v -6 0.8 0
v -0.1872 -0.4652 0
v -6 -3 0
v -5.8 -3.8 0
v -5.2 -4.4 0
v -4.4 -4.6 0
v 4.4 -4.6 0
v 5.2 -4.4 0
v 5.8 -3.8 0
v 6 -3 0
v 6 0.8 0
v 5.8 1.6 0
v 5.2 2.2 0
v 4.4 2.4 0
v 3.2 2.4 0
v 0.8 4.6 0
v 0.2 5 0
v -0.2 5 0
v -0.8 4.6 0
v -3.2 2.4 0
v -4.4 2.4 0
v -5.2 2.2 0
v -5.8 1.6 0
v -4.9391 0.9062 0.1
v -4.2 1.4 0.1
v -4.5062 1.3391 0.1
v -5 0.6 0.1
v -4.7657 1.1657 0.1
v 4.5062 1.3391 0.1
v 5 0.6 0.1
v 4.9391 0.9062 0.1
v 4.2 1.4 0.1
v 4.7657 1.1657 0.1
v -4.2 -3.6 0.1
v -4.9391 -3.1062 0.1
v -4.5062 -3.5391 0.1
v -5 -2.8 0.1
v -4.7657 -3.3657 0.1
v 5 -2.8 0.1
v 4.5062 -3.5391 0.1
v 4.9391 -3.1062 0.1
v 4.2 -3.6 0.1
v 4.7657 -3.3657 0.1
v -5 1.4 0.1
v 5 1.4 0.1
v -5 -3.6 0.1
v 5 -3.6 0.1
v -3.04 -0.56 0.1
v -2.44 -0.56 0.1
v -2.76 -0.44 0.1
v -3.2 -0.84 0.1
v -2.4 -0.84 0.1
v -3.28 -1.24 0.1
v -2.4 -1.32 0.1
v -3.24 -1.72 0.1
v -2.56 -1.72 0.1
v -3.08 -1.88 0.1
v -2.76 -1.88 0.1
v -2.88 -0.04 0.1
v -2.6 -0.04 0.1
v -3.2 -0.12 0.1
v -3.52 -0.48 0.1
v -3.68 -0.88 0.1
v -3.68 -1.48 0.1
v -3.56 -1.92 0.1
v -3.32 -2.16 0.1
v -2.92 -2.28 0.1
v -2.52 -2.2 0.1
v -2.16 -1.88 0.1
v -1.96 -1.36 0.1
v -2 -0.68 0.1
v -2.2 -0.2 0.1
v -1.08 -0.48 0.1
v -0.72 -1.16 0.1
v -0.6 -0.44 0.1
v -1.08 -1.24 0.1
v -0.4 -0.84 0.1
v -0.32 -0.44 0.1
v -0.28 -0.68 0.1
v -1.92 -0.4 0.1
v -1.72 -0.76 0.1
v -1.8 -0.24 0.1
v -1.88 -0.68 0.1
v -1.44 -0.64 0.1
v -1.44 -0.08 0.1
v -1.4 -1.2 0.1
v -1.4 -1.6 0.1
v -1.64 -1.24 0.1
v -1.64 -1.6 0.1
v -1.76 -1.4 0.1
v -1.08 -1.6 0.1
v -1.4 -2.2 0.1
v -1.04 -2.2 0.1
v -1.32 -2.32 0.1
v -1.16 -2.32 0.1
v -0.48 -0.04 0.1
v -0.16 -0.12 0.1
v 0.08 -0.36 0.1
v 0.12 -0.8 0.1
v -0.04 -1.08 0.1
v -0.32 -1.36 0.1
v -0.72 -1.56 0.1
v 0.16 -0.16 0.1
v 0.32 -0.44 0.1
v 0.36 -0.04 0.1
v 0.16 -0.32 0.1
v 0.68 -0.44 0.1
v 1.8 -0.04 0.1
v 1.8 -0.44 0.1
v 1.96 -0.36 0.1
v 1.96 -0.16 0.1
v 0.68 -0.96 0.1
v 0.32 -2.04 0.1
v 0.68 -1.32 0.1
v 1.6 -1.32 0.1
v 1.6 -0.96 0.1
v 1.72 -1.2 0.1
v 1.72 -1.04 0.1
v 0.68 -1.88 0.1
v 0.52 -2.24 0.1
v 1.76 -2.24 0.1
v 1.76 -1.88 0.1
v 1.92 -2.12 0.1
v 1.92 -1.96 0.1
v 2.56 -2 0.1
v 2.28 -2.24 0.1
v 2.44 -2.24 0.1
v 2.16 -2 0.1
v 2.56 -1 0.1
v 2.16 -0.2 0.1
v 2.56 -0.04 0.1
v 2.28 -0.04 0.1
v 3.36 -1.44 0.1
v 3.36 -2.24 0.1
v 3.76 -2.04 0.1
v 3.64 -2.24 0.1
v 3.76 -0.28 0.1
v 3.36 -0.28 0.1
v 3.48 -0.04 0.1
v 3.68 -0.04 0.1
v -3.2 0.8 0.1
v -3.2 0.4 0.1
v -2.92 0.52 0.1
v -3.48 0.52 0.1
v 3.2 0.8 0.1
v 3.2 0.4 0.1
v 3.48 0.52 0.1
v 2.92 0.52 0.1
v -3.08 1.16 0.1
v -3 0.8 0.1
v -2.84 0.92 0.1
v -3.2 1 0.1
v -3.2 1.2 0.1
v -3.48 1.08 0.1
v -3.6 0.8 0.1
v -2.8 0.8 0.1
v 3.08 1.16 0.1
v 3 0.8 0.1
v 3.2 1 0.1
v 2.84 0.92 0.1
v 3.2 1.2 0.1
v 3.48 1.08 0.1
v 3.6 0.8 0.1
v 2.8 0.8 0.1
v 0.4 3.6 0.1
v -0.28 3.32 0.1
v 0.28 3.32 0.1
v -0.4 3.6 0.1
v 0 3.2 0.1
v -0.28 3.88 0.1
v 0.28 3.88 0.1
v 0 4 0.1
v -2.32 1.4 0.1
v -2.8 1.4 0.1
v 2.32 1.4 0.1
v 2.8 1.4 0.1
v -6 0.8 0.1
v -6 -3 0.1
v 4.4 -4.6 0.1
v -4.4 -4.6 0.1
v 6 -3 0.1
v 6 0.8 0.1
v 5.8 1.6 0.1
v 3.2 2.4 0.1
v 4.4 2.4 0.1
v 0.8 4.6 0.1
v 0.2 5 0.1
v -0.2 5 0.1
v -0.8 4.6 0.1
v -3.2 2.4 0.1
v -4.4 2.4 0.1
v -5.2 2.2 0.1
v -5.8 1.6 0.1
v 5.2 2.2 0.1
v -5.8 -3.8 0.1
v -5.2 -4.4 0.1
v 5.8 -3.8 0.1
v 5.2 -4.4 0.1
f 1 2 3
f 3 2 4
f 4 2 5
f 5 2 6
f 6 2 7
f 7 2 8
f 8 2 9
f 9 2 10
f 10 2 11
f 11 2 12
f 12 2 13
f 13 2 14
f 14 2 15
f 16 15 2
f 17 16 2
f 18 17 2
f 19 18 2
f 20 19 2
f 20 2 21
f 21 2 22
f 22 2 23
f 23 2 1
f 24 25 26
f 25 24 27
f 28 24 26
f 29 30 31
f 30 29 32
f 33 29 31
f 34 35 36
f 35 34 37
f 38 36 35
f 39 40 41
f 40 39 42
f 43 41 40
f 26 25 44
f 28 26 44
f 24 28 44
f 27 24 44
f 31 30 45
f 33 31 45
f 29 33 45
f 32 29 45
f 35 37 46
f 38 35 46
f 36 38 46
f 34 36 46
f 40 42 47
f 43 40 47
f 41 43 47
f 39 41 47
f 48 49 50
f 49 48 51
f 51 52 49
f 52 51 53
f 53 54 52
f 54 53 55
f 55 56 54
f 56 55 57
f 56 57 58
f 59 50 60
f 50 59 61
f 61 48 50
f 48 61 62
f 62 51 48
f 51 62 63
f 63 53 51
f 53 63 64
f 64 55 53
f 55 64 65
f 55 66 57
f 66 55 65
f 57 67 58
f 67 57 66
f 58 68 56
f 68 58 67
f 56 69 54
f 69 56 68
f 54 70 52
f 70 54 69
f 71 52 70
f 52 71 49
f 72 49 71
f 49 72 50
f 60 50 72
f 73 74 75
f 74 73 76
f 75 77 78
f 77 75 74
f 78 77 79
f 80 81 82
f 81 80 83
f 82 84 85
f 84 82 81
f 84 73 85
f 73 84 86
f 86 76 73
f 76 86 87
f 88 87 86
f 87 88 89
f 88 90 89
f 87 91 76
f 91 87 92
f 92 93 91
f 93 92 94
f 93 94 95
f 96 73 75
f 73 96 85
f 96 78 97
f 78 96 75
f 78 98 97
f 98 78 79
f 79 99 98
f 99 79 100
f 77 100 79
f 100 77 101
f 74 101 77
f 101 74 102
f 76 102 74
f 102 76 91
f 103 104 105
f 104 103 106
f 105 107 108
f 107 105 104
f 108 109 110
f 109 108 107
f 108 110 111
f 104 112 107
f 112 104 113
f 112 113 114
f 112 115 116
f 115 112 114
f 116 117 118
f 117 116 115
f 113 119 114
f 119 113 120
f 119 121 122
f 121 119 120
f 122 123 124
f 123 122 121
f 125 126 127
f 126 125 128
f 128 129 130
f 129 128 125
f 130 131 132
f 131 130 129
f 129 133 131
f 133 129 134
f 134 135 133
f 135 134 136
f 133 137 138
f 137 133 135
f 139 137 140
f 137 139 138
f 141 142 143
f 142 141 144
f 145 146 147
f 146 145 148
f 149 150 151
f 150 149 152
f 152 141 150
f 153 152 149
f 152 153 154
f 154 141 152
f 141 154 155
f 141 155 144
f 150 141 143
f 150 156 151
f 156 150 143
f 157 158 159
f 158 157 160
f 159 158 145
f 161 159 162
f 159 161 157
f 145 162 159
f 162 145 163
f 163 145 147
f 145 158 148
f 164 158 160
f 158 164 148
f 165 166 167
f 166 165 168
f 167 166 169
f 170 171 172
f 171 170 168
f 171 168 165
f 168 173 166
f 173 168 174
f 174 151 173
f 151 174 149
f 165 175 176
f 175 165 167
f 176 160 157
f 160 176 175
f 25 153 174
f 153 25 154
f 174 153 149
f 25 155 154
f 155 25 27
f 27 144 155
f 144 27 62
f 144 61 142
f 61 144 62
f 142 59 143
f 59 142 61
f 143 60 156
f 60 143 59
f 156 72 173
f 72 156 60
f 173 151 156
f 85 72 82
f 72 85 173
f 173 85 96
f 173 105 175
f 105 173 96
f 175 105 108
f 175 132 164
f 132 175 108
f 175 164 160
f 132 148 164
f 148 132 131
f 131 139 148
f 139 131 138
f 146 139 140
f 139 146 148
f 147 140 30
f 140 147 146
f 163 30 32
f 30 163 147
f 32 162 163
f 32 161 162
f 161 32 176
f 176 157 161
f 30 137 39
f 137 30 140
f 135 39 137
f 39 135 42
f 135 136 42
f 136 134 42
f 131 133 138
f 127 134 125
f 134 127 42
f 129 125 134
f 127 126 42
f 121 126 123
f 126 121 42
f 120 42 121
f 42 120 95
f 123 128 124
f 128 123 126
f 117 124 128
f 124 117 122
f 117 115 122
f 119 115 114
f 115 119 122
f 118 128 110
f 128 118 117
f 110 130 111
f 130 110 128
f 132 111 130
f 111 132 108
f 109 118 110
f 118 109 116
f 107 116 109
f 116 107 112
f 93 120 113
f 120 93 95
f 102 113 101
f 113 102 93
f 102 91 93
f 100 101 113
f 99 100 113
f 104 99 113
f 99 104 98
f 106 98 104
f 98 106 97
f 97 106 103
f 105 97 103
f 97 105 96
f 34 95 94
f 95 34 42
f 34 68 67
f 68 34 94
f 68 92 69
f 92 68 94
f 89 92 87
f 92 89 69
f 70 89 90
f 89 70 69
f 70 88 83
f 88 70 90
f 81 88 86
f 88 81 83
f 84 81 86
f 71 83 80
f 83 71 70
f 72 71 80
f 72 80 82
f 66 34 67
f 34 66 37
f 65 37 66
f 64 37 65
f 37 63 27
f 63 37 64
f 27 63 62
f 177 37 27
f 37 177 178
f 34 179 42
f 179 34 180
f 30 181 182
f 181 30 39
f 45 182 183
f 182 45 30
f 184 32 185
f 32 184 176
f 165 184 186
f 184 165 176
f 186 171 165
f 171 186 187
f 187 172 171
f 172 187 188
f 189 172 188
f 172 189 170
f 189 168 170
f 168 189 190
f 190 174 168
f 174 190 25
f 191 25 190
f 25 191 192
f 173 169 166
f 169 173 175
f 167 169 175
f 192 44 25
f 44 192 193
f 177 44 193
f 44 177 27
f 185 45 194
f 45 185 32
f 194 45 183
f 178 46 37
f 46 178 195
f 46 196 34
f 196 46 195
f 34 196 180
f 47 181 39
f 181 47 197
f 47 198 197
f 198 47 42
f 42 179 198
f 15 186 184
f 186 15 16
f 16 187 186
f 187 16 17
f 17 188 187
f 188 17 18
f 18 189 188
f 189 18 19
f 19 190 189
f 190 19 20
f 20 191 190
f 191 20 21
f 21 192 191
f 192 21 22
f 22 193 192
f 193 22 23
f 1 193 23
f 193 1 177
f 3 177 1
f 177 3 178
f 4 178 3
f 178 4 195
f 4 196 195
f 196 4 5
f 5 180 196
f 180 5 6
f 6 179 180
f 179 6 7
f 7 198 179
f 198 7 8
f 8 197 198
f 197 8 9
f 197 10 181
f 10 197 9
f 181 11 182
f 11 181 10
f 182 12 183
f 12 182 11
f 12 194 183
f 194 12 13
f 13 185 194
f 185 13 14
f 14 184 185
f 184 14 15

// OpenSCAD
// file: ../p/1-4ndis.scad
use <../lib.scad>
function ldraw_lib__1_4ndis() = [
// 0 Disc Negative 0.25
// 0 Name: 1-4ndis.dat
// 0 Author: James Jessiman
// 0 !LDRAW_ORG Primitive UPDATE 2012-01
// 0 !LICENSE Licensed under CC BY 2.0 and CC BY 4.0 : see CAreadme.txt
// 
// 0 BFC CERTIFY CCW
  [0,"BFC","CERTIFY"],
  [0,"BFC","CCW"],
// 
// 0 !HISTORY 2002-03-23 [sbliss] Added BFC Statement
// 0 !HISTORY 2002-04-25 [PTadmin] Official Update 2002-02
// 0 !HISTORY 2007-06-22 [PTadmin] Header formatted for Contributor Agreement
// 0 !HISTORY 2008-07-01 [PTadmin] Official Update 2008-01
// 0 !HISTORY 2012-02-16 [Philo] Changed to CCW
// 0 !HISTORY 2012-03-30 [PTadmin] Official Update 2012-01
// 
// 
// 3 16 0.9239 0 0.3827 1 0 0 1 0 1
  [3,16,0.9239,0,0.3827,1,0,0,1,0,1],
// 3 16 0.7071 0 0.7071 0.9239 0 0.3827 1 0 1
  [3,16,0.7071,0,0.7071,0.9239,0,0.3827,1,0,1],
// 3 16 0.3827 0 0.9239 0.7071 0 0.7071 1 0 1
  [3,16,0.3827,0,0.9239,0.7071,0,0.7071,1,0,1],
// 3 16 0 0 1 0.3827 0 0.9239 1 0 1
  [3,16,0,0,1,0.3827,0,0.9239,1,0,1],
];
module ldraw_lib__1_4ndis(step=0, col=false, unit=2/5, alt=false, line=0.2, solid=!$preview)
    makepoly(ldraw_lib__1_4ndis(), step=step, col=col, unit=unit, alt=alt, line=line, solid=solid);
ldraw_lib__1_4ndis(line=0.2);
// file: ../p/1-4chrd.scad
use <../lib.scad>
function ldraw_lib__1_4chrd() = [
// 0 Chord 0.25
// 0 Name: 1-4chrd.dat
// 0 Author: Tony Hafner [hafhead]
// 0 !LDRAW_ORG Primitive UPDATE 2012-02
// 0 !LICENSE Licensed under CC BY 2.0 and CC BY 4.0 : see CAreadme.txt
// 
// 0 BFC CERTIFY CCW
  [0,"BFC","CERTIFY"],
  [0,"BFC","CCW"],
// 
// 0 !HISTORY 2004-04-22 [PTadmin] Official Update 2004-02
// 0 !HISTORY 2007-10-09 [PTadmin] Header formatted for Contributor Agreement
// 0 !HISTORY 2008-07-01 [PTadmin] Official Update 2008-01
// 0 !HISTORY 2012-08-02 [MMR1988] Re-creation with PrimGen2 and Rectifier
// 0 !HISTORY 2012-08-09 [PTadmin] Official Update 2012-02
// 
// 
// 4 16 0.9239 0 0.3827 0.3827 0 0.9239 0 0 1 1 0 0
  [4,16,0.9239,0,0.3827,0.3827,0,0.9239,0,0,1,1,0,0],
// 3 16 0.7071 0 0.7071 0.3827 0 0.9239 0.9239 0 0.3827
  [3,16,0.7071,0,0.7071,0.3827,0,0.9239,0.9239,0,0.3827],
];
module ldraw_lib__1_4chrd(step=0, col=false, unit=2/5, alt=false, line=0.2, solid=!$preview)
    makepoly(ldraw_lib__1_4chrd(), step=step, col=col, unit=unit, alt=alt, line=line, solid=solid);
ldraw_lib__1_4chrd(line=0.2);
// main file
use <../lib.scad>
use <../p/1-4chrd.scad>
use <../p/1-4ndis.scad>
function ldraw_lib__4603014b() = [
// 0 Sticker  1.2 x  1.5 with White "OPEN" on Red Sign
// 0 Name: 4603014b.dat
// 0 Author: Takeshi Takahashi [RainbowDolphin]
// 0 !LDRAW_ORG Part UPDATE 2020-03
// 0 !LICENSE Licensed under CC BY 2.0 and CC BY 4.0 : see CAreadme.txt
// 
// 0 BFC CERTIFY CCW
  [0,"BFC","CERTIFY"],
  [0,"BFC","CCW"],
// 
// 0 !KEYWORDS Cafe, Set 3061, Sweets
// 
// 0 !HISTORY 2020-12-29 [PTadmin] Official Update 2020-03
// 
// 
// 3 16 -15 0 2 -.468 0 -1.163 -15 0 -7.5
  [3,16,-15,0,2,-.468,0,-1.163,-15,0,-7.5],
// 3 16 -15 0 -7.5 -.468 0 -1.163 -14.5 0 -9.5
  [3,16,-15,0,-7.5,-.468,0,-1.163,-14.5,0,-9.5],
// 3 16 -14.5 0 -9.5 -.468 0 -1.163 -13 0 -11
  [3,16,-14.5,0,-9.5,-.468,0,-1.163,-13,0,-11],
// 3 16 -13 0 -11 -.468 0 -1.163 -11 0 -11.5
  [3,16,-13,0,-11,-.468,0,-1.163,-11,0,-11.5],
// 3 16 -11 0 -11.5 -.468 0 -1.163 11 0 -11.5
  [3,16,-11,0,-11.5,-.468,0,-1.163,11,0,-11.5],
// 3 16 11 0 -11.5 -.468 0 -1.163 13 0 -11
  [3,16,11,0,-11.5,-.468,0,-1.163,13,0,-11],
// 3 16 13 0 -11 -.468 0 -1.163 14.5 0 -9.5
  [3,16,13,0,-11,-.468,0,-1.163,14.5,0,-9.5],
// 3 16 14.5 0 -9.5 -.468 0 -1.163 15 0 -7.5
  [3,16,14.5,0,-9.5,-.468,0,-1.163,15,0,-7.5],
// 3 16 15 0 -7.5 -.468 0 -1.163 15 0 2
  [3,16,15,0,-7.5,-.468,0,-1.163,15,0,2],
// 3 16 15 0 2 -.468 0 -1.163 14.5 0 4
  [3,16,15,0,2,-.468,0,-1.163,14.5,0,4],
// 3 16 14.5 0 4 -.468 0 -1.163 13 0 5.5
  [3,16,14.5,0,4,-.468,0,-1.163,13,0,5.5],
// 3 16 13 0 5.5 -.468 0 -1.163 11 0 6
  [3,16,13,0,5.5,-.468,0,-1.163,11,0,6],
// 3 16 11 0 6 -.468 0 -1.163 8 0 6
  [3,16,11,0,6,-.468,0,-1.163,8,0,6],
// 3 16 2 0 11.5 8 0 6 -.468 0 -1.163
  [3,16,2,0,11.5,8,0,6,-.468,0,-1.163],
// 3 16 .5 0 12.5 2 0 11.5 -.468 0 -1.163
  [3,16,.5,0,12.5,2,0,11.5,-.468,0,-1.163],
// 3 16 -.5 0 12.5 .5 0 12.5 -.468 0 -1.163
  [3,16,-.5,0,12.5,.5,0,12.5,-.468,0,-1.163],
// 3 16 -2 0 11.5 -.5 0 12.5 -.468 0 -1.163
  [3,16,-2,0,11.5,-.5,0,12.5,-.468,0,-1.163],
// 3 16 -8 0 6 -2 0 11.5 -.468 0 -1.163
  [3,16,-8,0,6,-2,0,11.5,-.468,0,-1.163],
// 3 16 -8 0 6 -.468 0 -1.163 -11 0 6
  [3,16,-8,0,6,-.468,0,-1.163,-11,0,6],
// 3 16 -11 0 6 -.468 0 -1.163 -13 0 5.5
  [3,16,-11,0,6,-.468,0,-1.163,-13,0,5.5],
// 3 16 -13 0 5.5 -.468 0 -1.163 -14.5 0 4
  [3,16,-13,0,5.5,-.468,0,-1.163,-14.5,0,4],
// 3 16 -14.5 0 4 -.468 0 -1.163 -15 0 2
  [3,16,-14.5,0,4,-.468,0,-1.163,-15,0,2],
// 1 4 -10.5 -.25 1.5 0 0 -2 0 1 0 2 0 0 1-4chrd.dat
  [1,4,-10.5,-.25,1.5,0,0,-2,0,1,0,2,0,0, ldraw_lib__1_4chrd()],
// 1 4 10.5 -.25 1.5 2 0 0 0 1 0 0 0 2 1-4chrd.dat
  [1,4,10.5,-.25,1.5,2,0,0,0,1,0,0,0,2, ldraw_lib__1_4chrd()],
// 1 4 -10.5 -.25 -7 -2 0 0 0 1 0 0 0 -2 1-4chrd.dat
  [1,4,-10.5,-.25,-7,-2,0,0,0,1,0,0,0,-2, ldraw_lib__1_4chrd()],
// 1 4 10.5 -.25 -7 0 0 2 0 1 0 -2 0 0 1-4chrd.dat
  [1,4,10.5,-.25,-7,0,0,2,0,1,0,-2,0,0, ldraw_lib__1_4chrd()],
// 1 15 -10.5 -.25 1.5 0 0 -2 0 1 0 2 0 0 1-4ndis.dat
  [1,15,-10.5,-.25,1.5,0,0,-2,0,1,0,2,0,0, ldraw_lib__1_4ndis()],
// 1 15 10.5 -.25 1.5 2 0 0 0 1 0 0 0 2 1-4ndis.dat
  [1,15,10.5,-.25,1.5,2,0,0,0,1,0,0,0,2, ldraw_lib__1_4ndis()],
// 1 15 -10.5 -.25 -7 -2 0 0 0 1 0 0 0 -2 1-4ndis.dat
  [1,15,-10.5,-.25,-7,-2,0,0,0,1,0,0,0,-2, ldraw_lib__1_4ndis()],
// 1 15 10.5 -.25 -7 0 0 2 0 1 0 -2 0 0 1-4ndis.dat
  [1,15,10.5,-.25,-7,0,0,2,0,1,0,-2,0,0, ldraw_lib__1_4ndis()],
// 4 4 -6.1 -.25 -1.4 -6.9 -.25 -1.1 -7.6 -.25 -1.4 -8 -.25 -2.1
  [4,4,-6.1,-.25,-1.4,-6.9,-.25,-1.1,-7.6,-.25,-1.4,-8,-.25,-2.1],
// 4 4 -6 -.25 -2.1 -6.1 -.25 -1.4 -8 -.25 -2.1 -8.2 -.25 -3.1
  [4,4,-6,-.25,-2.1,-6.1,-.25,-1.4,-8,-.25,-2.1,-8.2,-.25,-3.1],
// 4 4 -6 -.25 -3.3 -6 -.25 -2.1 -8.2 -.25 -3.1 -8.1 -.25 -4.3
  [4,4,-6,-.25,-3.3,-6,-.25,-2.1,-8.2,-.25,-3.1,-8.1,-.25,-4.3],
// 4 4 -6.4 -.25 -4.3 -6 -.25 -3.3 -8.1 -.25 -4.3 -7.7 -.25 -4.7
  [4,4,-6.4,-.25,-4.3,-6,-.25,-3.3,-8.1,-.25,-4.3,-7.7,-.25,-4.7],
// 3 4 -6.4 -.25 -4.3 -7.7 -.25 -4.7 -6.9 -.25 -4.7
  [3,4,-6.4,-.25,-4.3,-7.7,-.25,-4.7,-6.9,-.25,-4.7],
// 4 15 -6.9 -.25 -1.1 -6.5 -.25 -.1 -7.2 -.25 -.1 -8 -.25 -.3
  [4,15,-6.9,-.25,-1.1,-6.5,-.25,-.1,-7.2,-.25,-.1,-8,-.25,-.3],
// 4 15 -7.6 -.25 -1.4 -6.9 -.25 -1.1 -8 -.25 -.3 -8.8 -.25 -1.2
  [4,15,-7.6,-.25,-1.4,-6.9,-.25,-1.1,-8,-.25,-.3,-8.8,-.25,-1.2],
// 4 15 -8 -.25 -2.1 -7.6 -.25 -1.4 -8.8 -.25 -1.2 -9.2 -.25 -2.2
  [4,15,-8,-.25,-2.1,-7.6,-.25,-1.4,-8.8,-.25,-1.2,-9.2,-.25,-2.2],
// 4 15 -8.2 -.25 -3.1 -8 -.25 -2.1 -9.2 -.25 -2.2 -9.2 -.25 -3.7
  [4,15,-8.2,-.25,-3.1,-8,-.25,-2.1,-9.2,-.25,-2.2,-9.2,-.25,-3.7],
// 4 15 -8.1 -.25 -4.3 -8.2 -.25 -3.1 -9.2 -.25 -3.7 -8.9 -.25 -4.8
  [4,15,-8.1,-.25,-4.3,-8.2,-.25,-3.1,-9.2,-.25,-3.7,-8.9,-.25,-4.8],
// 4 15 -8.1 -.25 -4.3 -8.9 -.25 -4.8 -8.3 -.25 -5.4 -7.7 -.25 -4.7
  [4,15,-8.1,-.25,-4.3,-8.9,-.25,-4.8,-8.3,-.25,-5.4,-7.7,-.25,-4.7],
// 4 15 -7.7 -.25 -4.7 -8.3 -.25 -5.4 -7.3 -.25 -5.7 -6.9 -.25 -4.7
  [4,15,-7.7,-.25,-4.7,-8.3,-.25,-5.4,-7.3,-.25,-5.7,-6.9,-.25,-4.7],
// 4 15 -6.9 -.25 -4.7 -7.3 -.25 -5.7 -6.3 -.25 -5.5 -6.4 -.25 -4.3
  [4,15,-6.9,-.25,-4.7,-7.3,-.25,-5.7,-6.3,-.25,-5.5,-6.4,-.25,-4.3],
// 4 15 -6.4 -.25 -4.3 -6.3 -.25 -5.5 -5.4 -.25 -4.7 -6 -.25 -3.3
  [4,15,-6.4,-.25,-4.3,-6.3,-.25,-5.5,-5.4,-.25,-4.7,-6,-.25,-3.3],
// 4 15 -6 -.25 -3.3 -5.4 -.25 -4.7 -4.9 -.25 -3.4 -6 -.25 -2.1
  [4,15,-6,-.25,-3.3,-5.4,-.25,-4.7,-4.9,-.25,-3.4,-6,-.25,-2.1],
// 4 15 -6 -.25 -2.1 -4.9 -.25 -3.4 -5 -.25 -1.7 -6.1 -.25 -1.4
  [4,15,-6,-.25,-2.1,-4.9,-.25,-3.4,-5,-.25,-1.7,-6.1,-.25,-1.4],
// 4 15 -6.1 -.25 -1.4 -5 -.25 -1.7 -5.5 -.25 -.5 -6.9 -.25 -1.1
  [4,15,-6.1,-.25,-1.4,-5,-.25,-1.7,-5.5,-.25,-.5,-6.9,-.25,-1.1],
// 3 15 -6.5 -.25 -.1 -6.9 -.25 -1.1 -5.5 -.25 -.5
  [3,15,-6.5,-.25,-.1,-6.9,-.25,-1.1,-5.5,-.25,-.5],
// 4 4 -2.7 -.25 -1.2 -2.7 -.25 -3.1 -1.8 -.25 -2.9 -1.5 -.25 -1.1
  [4,4,-2.7,-.25,-1.2,-2.7,-.25,-3.1,-1.8,-.25,-2.9,-1.5,-.25,-1.1],
// 4 4 -1.5 -.25 -1.1 -1.8 -.25 -2.9 -1 -.25 -2.1 -.8 -.25 -1.1
  [4,4,-1.5,-.25,-1.1,-1.8,-.25,-2.9,-1,-.25,-2.1,-.8,-.25,-1.1],
// 3 4 -.8 -.25 -1.1 -1 -.25 -2.1 -.7 -.25 -1.7
  [3,4,-.8,-.25,-1.1,-1,-.25,-2.1,-.7,-.25,-1.7],
// 4 15 -4.5 -.25 -.6 -4.8 -.25 -1 -4.7 -.25 -1.7 -4.3 -.25 -1.9
  [4,15,-4.5,-.25,-.6,-4.8,-.25,-1,-4.7,-.25,-1.7,-4.3,-.25,-1.9],
// 4 15 -4.5 -.25 -.6 -4.3 -.25 -1.9 -3.6 -.25 -1.6 -3.6 -.25 -.2
  [4,15,-4.5,-.25,-.6,-4.3,-.25,-1.9,-3.6,-.25,-1.6,-3.6,-.25,-.2],
// 4 15 -2.7 -.25 -1.2 -3.6 -.25 -.2 -3.6 -.25 -1.6 -3.5 -.25 -3
  [4,15,-2.7,-.25,-1.2,-3.6,-.25,-.2,-3.6,-.25,-1.6,-3.5,-.25,-3],
// 4 15 -2.7 -.25 -3.1 -2.7 -.25 -1.2 -3.5 -.25 -3 -3.5 -.25 -4
  [4,15,-2.7,-.25,-3.1,-2.7,-.25,-1.2,-3.5,-.25,-3,-3.5,-.25,-4],
// 4 15 -3.5 -.25 -4 -3.5 -.25 -3 -4.1 -.25 -3.1 -4.1 -.25 -4
  [4,15,-3.5,-.25,-4,-3.5,-.25,-3,-4.1,-.25,-3.1,-4.1,-.25,-4],
// 3 15 -4.1 -.25 -3.1 -4.4 -.25 -3.5 -4.1 -.25 -4
  [3,15,-4.1,-.25,-3.1,-4.4,-.25,-3.5,-4.1,-.25,-4],
// 4 15 -2.7 -.25 -4 -2.7 -.25 -3.1 -3.5 -.25 -4 -3.5 -.25 -5.5
  [4,15,-2.7,-.25,-4,-2.7,-.25,-3.1,-3.5,-.25,-4,-3.5,-.25,-5.5],
// 4 15 -2.6 -.25 -5.5 -2.7 -.25 -4 -3.5 -.25 -5.5 -3.3 -.25 -5.8
  [4,15,-2.6,-.25,-5.5,-2.7,-.25,-4,-3.5,-.25,-5.5,-3.3,-.25,-5.8],
// 3 15 -2.6 -.25 -5.5 -3.3 -.25 -5.8 -2.9 -.25 -5.8
  [3,15,-2.6,-.25,-5.5,-3.3,-.25,-5.8,-2.9,-.25,-5.8],
// 4 15 -1.2 -.25 -.1 -3.6 -.25 -.2 -2.7 -.25 -1.2 -1.5 -.25 -1.1
  [4,15,-1.2,-.25,-.1,-3.6,-.25,-.2,-2.7,-.25,-1.2,-1.5,-.25,-1.1],
// 4 15 -.4 -.25 -.3 -1.2 -.25 -.1 -1.5 -.25 -1.1 -.8 -.25 -1.1
  [4,15,-.4,-.25,-.3,-1.2,-.25,-.1,-1.5,-.25,-1.1,-.8,-.25,-1.1],
// 4 15 .2 -.25 -.9 -.4 -.25 -.3 -.8 -.25 -1.1 -.7 -.25 -1.7
  [4,15,.2,-.25,-.9,-.4,-.25,-.3,-.8,-.25,-1.1,-.7,-.25,-1.7],
// 4 15 .3 -.25 -2 .2 -.25 -.9 -.7 -.25 -1.7 -.1 -.25 -2.7
  [4,15,.3,-.25,-2,.2,-.25,-.9,-.7,-.25,-1.7,-.1,-.25,-2.7],
// 4 15 -.1 -.25 -2.7 -.7 -.25 -1.7 -1 -.25 -2.1 -.8 -.25 -3.4
  [4,15,-.1,-.25,-2.7,-.7,-.25,-1.7,-1,-.25,-2.1,-.8,-.25,-3.4],
// 4 15 -.8 -.25 -3.4 -1 -.25 -2.1 -1.8 -.25 -2.9 -1.8 -.25 -3.9
  [4,15,-.8,-.25,-3.4,-1,-.25,-2.1,-1.8,-.25,-2.9,-1.8,-.25,-3.9],
// 4 15 -1.8 -.25 -3.9 -1.8 -.25 -2.9 -2.7 -.25 -3.1 -2.7 -.25 -4
  [4,15,-1.8,-.25,-3.9,-1.8,-.25,-2.9,-2.7,-.25,-3.1,-2.7,-.25,-4],
// 4 15 .9 -.25 -.1 .4 -.25 -.4 .4 -.25 -.8 .8 -.25 -1.1
  [4,15,.9,-.25,-.1,.4,-.25,-.4,.4,-.25,-.8,.8,-.25,-1.1],
// 4 15 .9 -.25 -.1 .8 -.25 -1.1 1.7 -.25 -1.1 4.5 -.25 -.1
  [4,15,.9,-.25,-.1,.8,-.25,-1.1,1.7,-.25,-1.1,4.5,-.25,-.1],
// 4 15 4.5 -.25 -.1 1.7 -.25 -1.1 4.5 -.25 -1.1 4.9 -.25 -.9
  [4,15,4.5,-.25,-.1,1.7,-.25,-1.1,4.5,-.25,-1.1,4.9,-.25,-.9],
// 3 15 4.5 -.25 -.1 4.9 -.25 -.9 4.9 -.25 -.4
  [3,15,4.5,-.25,-.1,4.9,-.25,-.9,4.9,-.25,-.4],
// 4 15 1.7 -.25 -2.4 1.7 -.25 -1.1 .8 -.25 -1.1 .8 -.25 -5.1
  [4,15,1.7,-.25,-2.4,1.7,-.25,-1.1,.8,-.25,-1.1,.8,-.25,-5.1],
// 3 15 1.7 -.25 -2.4 .8 -.25 -5.1 1.7 -.25 -3.3
  [3,15,1.7,-.25,-2.4,.8,-.25,-5.1,1.7,-.25,-3.3],
// 4 15 4 -.25 -2.4 1.7 -.25 -2.4 1.7 -.25 -3.3 4 -.25 -3.3
  [4,15,4,-.25,-2.4,1.7,-.25,-2.4,1.7,-.25,-3.3,4,-.25,-3.3],
// 4 15 4.3 -.25 -2.6 4 -.25 -2.4 4 -.25 -3.3 4.3 -.25 -3
  [4,15,4.3,-.25,-2.6,4,-.25,-2.4,4,-.25,-3.3,4.3,-.25,-3],
// 4 15 1.7 -.25 -4.7 1.7 -.25 -3.3 .8 -.25 -5.1 1.3 -.25 -5.6
  [4,15,1.7,-.25,-4.7,1.7,-.25,-3.3,.8,-.25,-5.1,1.3,-.25,-5.6],
// 4 15 4.4 -.25 -4.7 1.7 -.25 -4.7 1.3 -.25 -5.6 4.4 -.25 -5.6
  [4,15,4.4,-.25,-4.7,1.7,-.25,-4.7,1.3,-.25,-5.6,4.4,-.25,-5.6],
// 4 15 4.8 -.25 -4.9 4.4 -.25 -4.7 4.4 -.25 -5.6 4.8 -.25 -5.3
  [4,15,4.8,-.25,-4.9,4.4,-.25,-4.7,4.4,-.25,-5.6,4.8,-.25,-5.3],
// 4 15 6.4 -.25 -5 5.4 -.25 -5 5.7 -.25 -5.6 6.1 -.25 -5.6
  [4,15,6.4,-.25,-5,5.4,-.25,-5,5.7,-.25,-5.6,6.1,-.25,-5.6],
// 4 15 5.4 -.25 -5 6.4 -.25 -5 6.4 -.25 -2.5 5.4 -.25 -.5
  [4,15,5.4,-.25,-5,6.4,-.25,-5,6.4,-.25,-2.5,5.4,-.25,-.5],
// 4 15 5.7 -.25 -.1 5.4 -.25 -.5 6.4 -.25 -2.5 6.4 -.25 -.1
  [4,15,5.7,-.25,-.1,5.4,-.25,-.5,6.4,-.25,-2.5,6.4,-.25,-.1],
// 4 15 8.4 -.25 -3.6 6.4 -.25 -.1 6.4 -.25 -2.5 8.4 -.25 -5.6
  [4,15,8.4,-.25,-3.6,6.4,-.25,-.1,6.4,-.25,-2.5,8.4,-.25,-5.6],
// 4 15 8.4 -.25 -3.6 8.4 -.25 -5.6 9.1 -.25 -5.6 9.4 -.25 -5.1
  [4,15,8.4,-.25,-3.6,8.4,-.25,-5.6,9.1,-.25,-5.6,9.4,-.25,-5.1],
// 4 15 8.4 -.25 -.7 8.4 -.25 -3.6 9.4 -.25 -5.1 9.4 -.25 -.7
  [4,15,8.4,-.25,-.7,8.4,-.25,-3.6,9.4,-.25,-5.1,9.4,-.25,-.7],
// 4 15 8.7 -.25 -.1 8.4 -.25 -.7 9.4 -.25 -.7 9.2 -.25 -.1
  [4,15,8.7,-.25,-.1,8.4,-.25,-.7,9.4,-.25,-.7,9.2,-.25,-.1],
// 4 15 -8.7 -.25 1.3 -8 -.25 1 -7.3 -.25 1.3 -8 -.25 2
  [4,15,-8.7,-.25,1.3,-8,-.25,1,-7.3,-.25,1.3,-8,-.25,2],
// 4 15 7.3 -.25 1.3 8 -.25 1 8.7 -.25 1.3 8 -.25 2
  [4,15,7.3,-.25,1.3,8,-.25,1,8.7,-.25,1.3,8,-.25,2],
// 4 70 -7.1 -.25 2.3 -7.7 -.25 2.9 -8 -.25 2.5 -7.5 -.25 2
  [4,70,-7.1,-.25,2.3,-7.7,-.25,2.9,-8,-.25,2.5,-7.5,-.25,2],
// 3 70 -8 -.25 2.5 -8 -.25 2 -7.5 -.25 2
  [3,70,-8,-.25,2.5,-8,-.25,2,-7.5,-.25,2],
// 4 15 -8 -.25 2.5 -7.7 -.25 2.9 -8 -.25 3 -8.7 -.25 2.7
  [4,15,-8,-.25,2.5,-7.7,-.25,2.9,-8,-.25,3,-8.7,-.25,2.7],
// 4 15 -8 -.25 2 -8 -.25 2.5 -8.7 -.25 2.7 -9 -.25 2
  [4,15,-8,-.25,2,-8,-.25,2.5,-8.7,-.25,2.7,-9,-.25,2],
// 3 15 -8 -.25 2 -9 -.25 2 -8.7 -.25 1.3
  [3,15,-8,-.25,2,-9,-.25,2,-8.7,-.25,1.3],
// 3 15 -7.5 -.25 2 -8 -.25 2 -7.3 -.25 1.3
  [3,15,-7.5,-.25,2,-8,-.25,2,-7.3,-.25,1.3],
// 4 15 -7.5 -.25 2 -7.3 -.25 1.3 -7 -.25 2 -7.1 -.25 2.3
  [4,15,-7.5,-.25,2,-7.3,-.25,1.3,-7,-.25,2,-7.1,-.25,2.3],
// 4 70 7.7 -.25 2.9 7.1 -.25 2.3 7.5 -.25 2 8 -.25 2.5
  [4,70,7.7,-.25,2.9,7.1,-.25,2.3,7.5,-.25,2,8,-.25,2.5],
// 3 70 8 -.25 2.5 7.5 -.25 2 8 -.25 2
  [3,70,8,-.25,2.5,7.5,-.25,2,8,-.25,2],
// 4 15 8 -.25 3 7.7 -.25 2.9 8 -.25 2.5 8.7 -.25 2.7
  [4,15,8,-.25,3,7.7,-.25,2.9,8,-.25,2.5,8.7,-.25,2.7],
// 4 15 8.7 -.25 2.7 8 -.25 2.5 8 -.25 2 9 -.25 2
  [4,15,8.7,-.25,2.7,8,-.25,2.5,8,-.25,2,9,-.25,2],
// 3 15 9 -.25 2 8 -.25 2 8.7 -.25 1.3
  [3,15,9,-.25,2,8,-.25,2,8.7,-.25,1.3],
// 3 15 8 -.25 2 7.5 -.25 2 7.3 -.25 1.3
  [3,15,8,-.25,2,7.5,-.25,2,7.3,-.25,1.3],
// 4 15 7 -.25 2 7.3 -.25 1.3 7.5 -.25 2 7.1 -.25 2.3
  [4,15,7,-.25,2,7.3,-.25,1.3,7.5,-.25,2,7.1,-.25,2.3],
// 4 9 1 -.25 9 -1 -.25 9 -.7 -.25 8.3 .7 -.25 8.3
  [4,9,1,-.25,9,-1,-.25,9,-.7,-.25,8.3,.7,-.25,8.3],
// 3 9 .7 -.25 8.3 -.7 -.25 8.3 0 -.25 8
  [3,9,.7,-.25,8.3,-.7,-.25,8.3,0,-.25,8],
// 4 9 .7 -.25 9.7 0 -.25 10 -.7 -.25 9.7 -1 -.25 9
  [4,9,.7,-.25,9.7,0,-.25,10,-.7,-.25,9.7,-1,-.25,9],
// 3 9 .7 -.25 9.7 -1 -.25 9 1 -.25 9
  [3,9,.7,-.25,9.7,-1,-.25,9,1,-.25,9],
// 4 70 -5.8 -.25 3.5 -.7 -.25 8.3 -1 -.25 9 -7 -.25 3.5
  [4,70,-5.8,-.25,3.5,-.7,-.25,8.3,-1,-.25,9,-7,-.25,3.5],
// 4 70 -7.1 -.25 2.3 -5.8 -.25 3.5 -7 -.25 3.5 -7.7 -.25 2.9
  [4,70,-7.1,-.25,2.3,-5.8,-.25,3.5,-7,-.25,3.5,-7.7,-.25,2.9],
// 4 70 1 -.25 9 .7 -.25 8.3 5.8 -.25 3.5 7 -.25 3.5
  [4,70,1,-.25,9,.7,-.25,8.3,5.8,-.25,3.5,7,-.25,3.5],
// 4 70 7 -.25 3.5 5.8 -.25 3.5 7.1 -.25 2.3 7.7 -.25 2.9
  [4,70,7,-.25,3.5,5.8,-.25,3.5,7.1,-.25,2.3,7.7,-.25,2.9],
// 4 4 -8 -.25 3 -7 -.25 3.5 -10.5 -.25 3.5 -8.7 -.25 2.7
  [4,4,-8,-.25,3,-7,-.25,3.5,-10.5,-.25,3.5,-8.7,-.25,2.7],
// 3 4 -7 -.25 3.5 -8 -.25 3 -7.7 -.25 2.9
  [3,4,-7,-.25,3.5,-8,-.25,3,-7.7,-.25,2.9],
// 4 4 -9 -.25 2 -8.7 -.25 2.7 -10.5 -.25 3.5 -12.5 -.25 1.5
  [4,4,-9,-.25,2,-8.7,-.25,2.7,-10.5,-.25,3.5,-12.5,-.25,1.5],
// 4 4 -8.7 -.25 1.3 -9 -.25 2 -12.5 -.25 1.5 -8.8 -.25 -1.2
  [4,4,-8.7,-.25,1.3,-9,-.25,2,-12.5,-.25,1.5,-8.8,-.25,-1.2],
// 4 4 -8.7 -.25 1.3 -8.8 -.25 -1.2 -8 -.25 -.3 -8 -.25 1
  [4,4,-8.7,-.25,1.3,-8.8,-.25,-1.2,-8,-.25,-.3,-8,-.25,1],
// 4 4 -8 -.25 1 -8 -.25 -.3 -7.2 -.25 -.1 -7.3 -.25 1.3
  [4,4,-8,-.25,1,-8,-.25,-.3,-7.2,-.25,-.1,-7.3,-.25,1.3],
// 4 4 -7.3 -.25 1.3 -7.2 -.25 -.1 -6.5 -.25 -.1 -7 -.25 2
  [4,4,-7.3,-.25,1.3,-7.2,-.25,-.1,-6.5,-.25,-.1,-7,-.25,2],
// 4 4 -5.8 -.25 3.5 -7 -.25 2 -6.5 -.25 -.1 -5.5 -.25 -.5
  [4,4,-5.8,-.25,3.5,-7,-.25,2,-6.5,-.25,-.1,-5.5,-.25,-.5],
// 3 4 -5.8 -.25 3.5 -7.1 -.25 2.3 -7 -.25 2
  [3,4,-5.8,-.25,3.5,-7.1,-.25,2.3,-7,-.25,2],
// 4 4 -5.8 -.25 3.5 -5.5 -.25 -.5 -4.5 -.25 -.6 -3.6 -.25 -.2
  [4,4,-5.8,-.25,3.5,-5.5,-.25,-.5,-4.5,-.25,-.6,-3.6,-.25,-.2],
// 3 4 -5.8 -.25 3.5 -3.6 -.25 -.2 -1.2 -.25 -.1
  [3,4,-5.8,-.25,3.5,-3.6,-.25,-.2,-1.2,-.25,-.1],
// 4 4 -5.8 -.25 3.5 -1.2 -.25 -.1 .9 -.25 -.1 5.8 -.25 3.5
  [4,4,-5.8,-.25,3.5,-1.2,-.25,-.1,.9,-.25,-.1,5.8,-.25,3.5],
// 3 4 5.8 -.25 3.5 .9 -.25 -.1 4.5 -.25 -.1
  [3,4,5.8,-.25,3.5,.9,-.25,-.1,4.5,-.25,-.1],
// 4 4 5.8 -.25 3.5 4.5 -.25 -.1 5.7 -.25 -.1 7 -.25 2
  [4,4,5.8,-.25,3.5,4.5,-.25,-.1,5.7,-.25,-.1,7,-.25,2],
// 3 4 5.8 -.25 3.5 7 -.25 2 7.1 -.25 2.3
  [3,4,5.8,-.25,3.5,7,-.25,2,7.1,-.25,2.3],
// 4 4 7 -.25 2 5.7 -.25 -.1 6.4 -.25 -.1 7.3 -.25 1.3
  [4,4,7,-.25,2,5.7,-.25,-.1,6.4,-.25,-.1,7.3,-.25,1.3],
// 4 4 7.3 -.25 1.3 6.4 -.25 -.1 8.4 -.25 -.7 8.7 -.25 -.1
  [4,4,7.3,-.25,1.3,6.4,-.25,-.1,8.4,-.25,-.7,8.7,-.25,-.1],
// 4 4 8 -.25 1 7.3 -.25 1.3 8.7 -.25 -.1 9.2 -.25 -.1
  [4,4,8,-.25,1,7.3,-.25,1.3,8.7,-.25,-.1,9.2,-.25,-.1],
// 4 4 8.7 -.25 1.3 8 -.25 1 9.2 -.25 -.1 12.5 -.25 1.5
  [4,4,8.7,-.25,1.3,8,-.25,1,9.2,-.25,-.1,12.5,-.25,1.5],
// 4 4 9 -.25 2 8.7 -.25 1.3 12.5 -.25 1.5 10.5 -.25 3.5
  [4,4,9,-.25,2,8.7,-.25,1.3,12.5,-.25,1.5,10.5,-.25,3.5],
// 3 4 10.5 -.25 3.5 8.7 -.25 2.7 9 -.25 2
  [3,4,10.5,-.25,3.5,8.7,-.25,2.7,9,-.25,2],
// 4 4 8 -.25 3 8.7 -.25 2.7 10.5 -.25 3.5 7 -.25 3.5
  [4,4,8,-.25,3,8.7,-.25,2.7,10.5,-.25,3.5,7,-.25,3.5],
// 3 4 7 -.25 3.5 7.7 -.25 2.9 8 -.25 3
  [3,4,7,-.25,3.5,7.7,-.25,2.9,8,-.25,3],
// 4 4 12.5 -.25 1.5 9.2 -.25 -.1 9.4 -.25 -.7 12.5 -.25 -7
  [4,4,12.5,-.25,1.5,9.2,-.25,-.1,9.4,-.25,-.7,12.5,-.25,-7],
// 4 4 12.5 -.25 -7 9.4 -.25 -.7 9.4 -.25 -5.1 10.5 -.25 -9
  [4,4,12.5,-.25,-7,9.4,-.25,-.7,9.4,-.25,-5.1,10.5,-.25,-9],
// 3 4 9.4 -.25 -5.1 9.1 -.25 -5.6 10.5 -.25 -9
  [3,4,9.4,-.25,-5.1,9.1,-.25,-5.6,10.5,-.25,-9],
// 3 4 9.1 -.25 -5.6 8.4 -.25 -5.6 10.5 -.25 -9
  [3,4,9.1,-.25,-5.6,8.4,-.25,-5.6,10.5,-.25,-9],
// 3 4 6.4 -.25 -.1 8.4 -.25 -3.6 8.4 -.25 -.7
  [3,4,6.4,-.25,-.1,8.4,-.25,-3.6,8.4,-.25,-.7],
// 4 4 6.1 -.25 -5.6 10.5 -.25 -9 8.4 -.25 -5.6 6.4 -.25 -5
  [4,4,6.1,-.25,-5.6,10.5,-.25,-9,8.4,-.25,-5.6,6.4,-.25,-5],
// 3 4 6.4 -.25 -2.5 6.4 -.25 -5 8.4 -.25 -5.6
  [3,4,6.4,-.25,-2.5,6.4,-.25,-5,8.4,-.25,-5.6],
// 3 4 6.1 -.25 -5.6 5.7 -.25 -5.6 10.5 -.25 -9
  [3,4,6.1,-.25,-5.6,5.7,-.25,-5.6,10.5,-.25,-9],
// 4 4 4.4 -.25 -5.6 10.5 -.25 -9 5.7 -.25 -5.6 4.8 -.25 -5.3
  [4,4,4.4,-.25,-5.6,10.5,-.25,-9,5.7,-.25,-5.6,4.8,-.25,-5.3],
// 4 4 10.5 -.25 -9 4.4 -.25 -5.6 1.3 -.25 -5.6 -2.9 -.25 -5.8
  [4,4,10.5,-.25,-9,4.4,-.25,-5.6,1.3,-.25,-5.6,-2.9,-.25,-5.8],
// 4 4 4.8 -.25 -5.3 5.7 -.25 -5.6 5.4 -.25 -5 4.8 -.25 -4.9
  [4,4,4.8,-.25,-5.3,5.7,-.25,-5.6,5.4,-.25,-5,4.8,-.25,-4.9],
// 4 4 4.8 -.25 -4.9 5.4 -.25 -5 4.3 -.25 -3 4.4 -.25 -4.7
  [4,4,4.8,-.25,-4.9,5.4,-.25,-5,4.3,-.25,-3,4.4,-.25,-4.7],
// 3 4 4.3 -.25 -3 4 -.25 -3.3 4.4 -.25 -4.7
  [3,4,4.3,-.25,-3,4,-.25,-3.3,4.4,-.25,-4.7],
// 4 4 1.7 -.25 -4.7 4.4 -.25 -4.7 4 -.25 -3.3 1.7 -.25 -3.3
  [4,4,1.7,-.25,-4.7,4.4,-.25,-4.7,4,-.25,-3.3,1.7,-.25,-3.3],
// 4 4 4.3 -.25 -2.6 4.3 -.25 -3 5.4 -.25 -5 4.9 -.25 -.9
  [4,4,4.3,-.25,-2.6,4.3,-.25,-3,5.4,-.25,-5,4.9,-.25,-.9],
// 4 4 4.9 -.25 -.9 5.4 -.25 -5 5.4 -.25 -.5 4.9 -.25 -.4
  [4,4,4.9,-.25,-.9,5.4,-.25,-5,5.4,-.25,-.5,4.9,-.25,-.4],
// 4 4 4.9 -.25 -.4 5.4 -.25 -.5 5.7 -.25 -.1 4.5 -.25 -.1
  [4,4,4.9,-.25,-.4,5.4,-.25,-.5,5.7,-.25,-.1,4.5,-.25,-.1],
// 4 4 4.3 -.25 -2.6 4.9 -.25 -.9 4.5 -.25 -1.1 4 -.25 -2.4
  [4,4,4.3,-.25,-2.6,4.9,-.25,-.9,4.5,-.25,-1.1,4,-.25,-2.4],
// 4 4 4 -.25 -2.4 4.5 -.25 -1.1 1.7 -.25 -1.1 1.7 -.25 -2.4
  [4,4,4,-.25,-2.4,4.5,-.25,-1.1,1.7,-.25,-1.1,1.7,-.25,-2.4],
// 4 4 -2.9 -.25 -5.8 1.3 -.25 -5.6 .8 -.25 -5.1 -2.6 -.25 -5.5
  [4,4,-2.9,-.25,-5.8,1.3,-.25,-5.6,.8,-.25,-5.1,-2.6,-.25,-5.5],
// 4 4 -2.6 -.25 -5.5 .8 -.25 -5.1 -.8 -.25 -3.4 -1.8 -.25 -3.9
  [4,4,-2.6,-.25,-5.5,.8,-.25,-5.1,-.8,-.25,-3.4,-1.8,-.25,-3.9],
// 3 4 -1.8 -.25 -3.9 -2.7 -.25 -4 -2.6 -.25 -5.5
  [3,4,-1.8,-.25,-3.9,-2.7,-.25,-4,-2.6,-.25,-5.5],
// 3 4 -.1 -.25 -2.7 -.8 -.25 -3.4 .8 -.25 -5.1
  [3,4,-.1,-.25,-2.7,-.8,-.25,-3.4,.8,-.25,-5.1],
// 3 4 .3 -.25 -2 -.1 -.25 -2.7 .8 -.25 -5.1
  [3,4,.3,-.25,-2,-.1,-.25,-2.7,.8,-.25,-5.1],
// 4 4 .3 -.25 -2 .8 -.25 -5.1 .8 -.25 -1.1 .2 -.25 -.9
  [4,4,.3,-.25,-2,.8,-.25,-5.1,.8,-.25,-1.1,.2,-.25,-.9],
// 4 4 .2 -.25 -.9 .8 -.25 -1.1 .4 -.25 -.8 -.4 -.25 -.3
  [4,4,.2,-.25,-.9,.8,-.25,-1.1,.4,-.25,-.8,-.4,-.25,-.3],
// 3 4 -.4 -.25 -.3 .4 -.25 -.8 .4 -.25 -.4
  [3,4,-.4,-.25,-.3,.4,-.25,-.8,.4,-.25,-.4],
// 4 4 -.4 -.25 -.3 .4 -.25 -.4 .9 -.25 -.1 -1.2 -.25 -.1
  [4,4,-.4,-.25,-.3,.4,-.25,-.4,.9,-.25,-.1,-1.2,-.25,-.1],
// 4 4 -10.5 -.25 -9 10.5 -.25 -9 -2.9 -.25 -5.8 -3.3 -.25 -5.8
  [4,4,-10.5,-.25,-9,10.5,-.25,-9,-2.9,-.25,-5.8,-3.3,-.25,-5.8],
// 4 4 -7.3 -.25 -5.7 -10.5 -.25 -9 -3.3 -.25 -5.8 -6.3 -.25 -5.5
  [4,4,-7.3,-.25,-5.7,-10.5,-.25,-9,-3.3,-.25,-5.8,-6.3,-.25,-5.5],
// 4 4 -6.3 -.25 -5.5 -3.3 -.25 -5.8 -3.5 -.25 -5.5 -5.4 -.25 -4.7
  [4,4,-6.3,-.25,-5.5,-3.3,-.25,-5.8,-3.5,-.25,-5.5,-5.4,-.25,-4.7],
// 4 4 -5.4 -.25 -4.7 -3.5 -.25 -5.5 -3.5 -.25 -4 -4.1 -.25 -4
  [4,4,-5.4,-.25,-4.7,-3.5,-.25,-5.5,-3.5,-.25,-4,-4.1,-.25,-4],
// 4 4 -4.9 -.25 -3.4 -5.4 -.25 -4.7 -4.1 -.25 -4 -4.4 -.25 -3.5
  [4,4,-4.9,-.25,-3.4,-5.4,-.25,-4.7,-4.1,-.25,-4,-4.4,-.25,-3.5],
// 4 4 -4.7 -.25 -1.7 -4.9 -.25 -3.4 -4.4 -.25 -3.5 -4.1 -.25 -3.1
  [4,4,-4.7,-.25,-1.7,-4.9,-.25,-3.4,-4.4,-.25,-3.5,-4.1,-.25,-3.1],
// 4 4 -4.3 -.25 -1.9 -4.7 -.25 -1.7 -4.1 -.25 -3.1 -3.5 -.25 -3
  [4,4,-4.3,-.25,-1.9,-4.7,-.25,-1.7,-4.1,-.25,-3.1,-3.5,-.25,-3],
// 3 4 -3.6 -.25 -1.6 -4.3 -.25 -1.9 -3.5 -.25 -3
  [3,4,-3.6,-.25,-1.6,-4.3,-.25,-1.9,-3.5,-.25,-3],
// 4 4 -5 -.25 -1.7 -4.9 -.25 -3.4 -4.7 -.25 -1.7 -4.8 -.25 -1
  [4,4,-5,-.25,-1.7,-4.9,-.25,-3.4,-4.7,-.25,-1.7,-4.8,-.25,-1],
// 3 4 -5.5 -.25 -.5 -5 -.25 -1.7 -4.8 -.25 -1
  [3,4,-5.5,-.25,-.5,-5,-.25,-1.7,-4.8,-.25,-1],
// 3 4 -5.5 -.25 -.5 -4.8 -.25 -1 -4.5 -.25 -.6
  [3,4,-5.5,-.25,-.5,-4.8,-.25,-1,-4.5,-.25,-.6],
// 4 4 -10.5 -.25 -9 -7.3 -.25 -5.7 -8.3 -.25 -5.4 -12.5 -.25 -7
  [4,4,-10.5,-.25,-9,-7.3,-.25,-5.7,-8.3,-.25,-5.4,-12.5,-.25,-7],
// 3 4 -8.9 -.25 -4.8 -12.5 -.25 -7 -8.3 -.25 -5.4
  [3,4,-8.9,-.25,-4.8,-12.5,-.25,-7,-8.3,-.25,-5.4],
// 3 4 -9.2 -.25 -3.7 -12.5 -.25 -7 -8.9 -.25 -4.8
  [3,4,-9.2,-.25,-3.7,-12.5,-.25,-7,-8.9,-.25,-4.8],
// 4 4 -12.5 -.25 -7 -9.2 -.25 -3.7 -9.2 -.25 -2.2 -12.5 -.25 1.5
  [4,4,-12.5,-.25,-7,-9.2,-.25,-3.7,-9.2,-.25,-2.2,-12.5,-.25,1.5],
// 3 4 -12.5 -.25 1.5 -9.2 -.25 -2.2 -8.8 -.25 -1.2
  [3,4,-12.5,-.25,1.5,-9.2,-.25,-2.2,-8.8,-.25,-1.2],
// 4 15 -12.5 -.25 -7 -12.5 -.25 1.5 -15 -.25 2 -15 -.25 -7.5
  [4,15,-12.5,-.25,-7,-12.5,-.25,1.5,-15,-.25,2,-15,-.25,-7.5],
// 4 15 10.5 -.25 -9 -10.5 -.25 -9 -11 -.25 -11.5 11 -.25 -11.5
  [4,15,10.5,-.25,-9,-10.5,-.25,-9,-11,-.25,-11.5,11,-.25,-11.5],
// 4 15 12.5 -.25 -7 15 -.25 -7.5 15 -.25 2 12.5 -.25 1.5
  [4,15,12.5,-.25,-7,15,-.25,-7.5,15,-.25,2,12.5,-.25,1.5],
// 4 15 12.5 -.25 1.5 15 -.25 2 14.5 -.25 4 12.5 -.25 3.5
  [4,15,12.5,-.25,1.5,15,-.25,2,14.5,-.25,4,12.5,-.25,3.5],
// 4 15 10.5 -.25 3.5 11 -.25 6 8 -.25 6 7 -.25 3.5
  [4,15,10.5,-.25,3.5,11,-.25,6,8,-.25,6,7,-.25,3.5],
// 4 15 1 -.25 9 7 -.25 3.5 8 -.25 6 2 -.25 11.5
  [4,15,1,-.25,9,7,-.25,3.5,8,-.25,6,2,-.25,11.5],
// 4 15 .7 -.25 9.7 1 -.25 9 2 -.25 11.5 .5 -.25 12.5
  [4,15,.7,-.25,9.7,1,-.25,9,2,-.25,11.5,.5,-.25,12.5],
// 4 15 0 -.25 10 .7 -.25 9.7 .5 -.25 12.5 -.5 -.25 12.5
  [4,15,0,-.25,10,.7,-.25,9.7,.5,-.25,12.5,-.5,-.25,12.5],
// 4 15 -.7 -.25 9.7 0 -.25 10 -.5 -.25 12.5 -2 -.25 11.5
  [4,15,-.7,-.25,9.7,0,-.25,10,-.5,-.25,12.5,-2,-.25,11.5],
// 4 15 -1 -.25 9 -.7 -.25 9.7 -2 -.25 11.5 -8 -.25 6
  [4,15,-1,-.25,9,-.7,-.25,9.7,-2,-.25,11.5,-8,-.25,6],
// 4 15 -7 -.25 3.5 -1 -.25 9 -8 -.25 6 -10.5 -.25 3.5
  [4,15,-7,-.25,3.5,-1,-.25,9,-8,-.25,6,-10.5,-.25,3.5],
// 4 15 -10.5 -.25 3.5 -8 -.25 6 -11 -.25 6 -13 -.25 5.5
  [4,15,-10.5,-.25,3.5,-8,-.25,6,-11,-.25,6,-13,-.25,5.5],
// 4 15 0 -.25 8 -.7 -.25 8.3 -5.8 -.25 3.5 5.8 -.25 3.5
  [4,15,0,-.25,8,-.7,-.25,8.3,-5.8,-.25,3.5,5.8,-.25,3.5],
// 3 15 .7 -.25 8.3 0 -.25 8 5.8 -.25 3.5
  [3,15,.7,-.25,8.3,0,-.25,8,5.8,-.25,3.5],
// 4 15 -12.5 -.25 3.5 -10.5 -.25 3.5 -13 -.25 5.5 -14.5 -.25 4
  [4,15,-12.5,-.25,3.5,-10.5,-.25,3.5,-13,-.25,5.5,-14.5,-.25,4],
// 4 15 -12.5 -.25 1.5 -12.5 -.25 3.5 -14.5 -.25 4 -15 -.25 2
  [4,15,-12.5,-.25,1.5,-12.5,-.25,3.5,-14.5,-.25,4,-15,-.25,2],
// 4 15 11 -.25 6 10.5 -.25 3.5 12.5 -.25 3.5 13 -.25 5.5
  [4,15,11,-.25,6,10.5,-.25,3.5,12.5,-.25,3.5,13,-.25,5.5],
// 3 15 13 -.25 5.5 12.5 -.25 3.5 14.5 -.25 4
  [3,15,13,-.25,5.5,12.5,-.25,3.5,14.5,-.25,4],
// 4 15 -12.5 -.25 -9 -12.5 -.25 -7 -15 -.25 -7.5 -14.5 -.25 -9.5
  [4,15,-12.5,-.25,-9,-12.5,-.25,-7,-15,-.25,-7.5,-14.5,-.25,-9.5],
// 4 15 -12.5 -.25 -9 -14.5 -.25 -9.5 -13 -.25 -11 -10.5 -.25 -9
  [4,15,-12.5,-.25,-9,-14.5,-.25,-9.5,-13,-.25,-11,-10.5,-.25,-9],
// 3 15 -10.5 -.25 -9 -13 -.25 -11 -11 -.25 -11.5
  [3,15,-10.5,-.25,-9,-13,-.25,-11,-11,-.25,-11.5],
// 4 15 15 -.25 -7.5 12.5 -.25 -7 12.5 -.25 -9 14.5 -.25 -9.5
  [4,15,15,-.25,-7.5,12.5,-.25,-7,12.5,-.25,-9,14.5,-.25,-9.5],
// 4 15 13 -.25 -11 14.5 -.25 -9.5 12.5 -.25 -9 10.5 -.25 -9
  [4,15,13,-.25,-11,14.5,-.25,-9.5,12.5,-.25,-9,10.5,-.25,-9],
// 3 15 10.5 -.25 -9 11 -.25 -11.5 13 -.25 -11
  [3,15,10.5,-.25,-9,11,-.25,-11.5,13,-.25,-11],
// 4 16 2 0 11.5 2 -.25 11.5 8 -.25 6 8 0 6
  [4,16,2,0,11.5,2,-.25,11.5,8,-.25,6,8,0,6],
// 4 16 .5 0 12.5 .5 -.25 12.5 2 -.25 11.5 2 0 11.5
  [4,16,.5,0,12.5,.5,-.25,12.5,2,-.25,11.5,2,0,11.5],
// 4 16 -.5 0 12.5 -.5 -.25 12.5 .5 -.25 12.5 .5 0 12.5
  [4,16,-.5,0,12.5,-.5,-.25,12.5,.5,-.25,12.5,.5,0,12.5],
// 4 16 -2 0 11.5 -2 -.25 11.5 -.5 -.25 12.5 -.5 0 12.5
  [4,16,-2,0,11.5,-2,-.25,11.5,-.5,-.25,12.5,-.5,0,12.5],
// 4 16 -8 0 6 -8 -.25 6 -2 -.25 11.5 -2 0 11.5
  [4,16,-8,0,6,-8,-.25,6,-2,-.25,11.5,-2,0,11.5],
// 4 16 -11 0 6 -11 -.25 6 -8 -.25 6 -8 0 6
  [4,16,-11,0,6,-11,-.25,6,-8,-.25,6,-8,0,6],
// 4 16 -13 0 5.5 -13 -.25 5.5 -11 -.25 6 -11 0 6
  [4,16,-13,0,5.5,-13,-.25,5.5,-11,-.25,6,-11,0,6],
// 4 16 -14.5 0 4 -14.5 -.25 4 -13 -.25 5.5 -13 0 5.5
  [4,16,-14.5,0,4,-14.5,-.25,4,-13,-.25,5.5,-13,0,5.5],
// 4 16 -15 0 2 -15 -.25 2 -14.5 -.25 4 -14.5 0 4
  [4,16,-15,0,2,-15,-.25,2,-14.5,-.25,4,-14.5,0,4],
// 4 16 -15 0 -7.5 -15 -.25 -7.5 -15 -.25 2 -15 0 2
  [4,16,-15,0,-7.5,-15,-.25,-7.5,-15,-.25,2,-15,0,2],
// 4 16 -14.5 0 -9.5 -14.5 -.25 -9.5 -15 -.25 -7.5 -15 0 -7.5
  [4,16,-14.5,0,-9.5,-14.5,-.25,-9.5,-15,-.25,-7.5,-15,0,-7.5],
// 4 16 -13 0 -11 -13 -.25 -11 -14.5 -.25 -9.5 -14.5 0 -9.5
  [4,16,-13,0,-11,-13,-.25,-11,-14.5,-.25,-9.5,-14.5,0,-9.5],
// 4 16 -11 0 -11.5 -11 -.25 -11.5 -13 -.25 -11 -13 0 -11
  [4,16,-11,0,-11.5,-11,-.25,-11.5,-13,-.25,-11,-13,0,-11],
// 4 16 11 0 -11.5 11 -.25 -11.5 -11 -.25 -11.5 -11 0 -11.5
  [4,16,11,0,-11.5,11,-.25,-11.5,-11,-.25,-11.5,-11,0,-11.5],
// 4 16 13 0 -11 13 -.25 -11 11 -.25 -11.5 11 0 -11.5
  [4,16,13,0,-11,13,-.25,-11,11,-.25,-11.5,11,0,-11.5],
// 4 16 14.5 0 -9.5 14.5 -.25 -9.5 13 -.25 -11 13 0 -11
  [4,16,14.5,0,-9.5,14.5,-.25,-9.5,13,-.25,-11,13,0,-11],
// 4 16 15 0 -7.5 15 -.25 -7.5 14.5 -.25 -9.5 14.5 0 -9.5
  [4,16,15,0,-7.5,15,-.25,-7.5,14.5,-.25,-9.5,14.5,0,-9.5],
// 4 16 15 0 2 15 -.25 2 15 -.25 -7.5 15 0 -7.5
  [4,16,15,0,2,15,-.25,2,15,-.25,-7.5,15,0,-7.5],
// 4 16 14.5 0 4 14.5 -.25 4 15 -.25 2 15 0 2
  [4,16,14.5,0,4,14.5,-.25,4,15,-.25,2,15,0,2],
// 4 16 13 0 5.5 13 -.25 5.5 14.5 -.25 4 14.5 0 4
  [4,16,13,0,5.5,13,-.25,5.5,14.5,-.25,4,14.5,0,4],
// 4 16 11 0 6 11 -.25 6 13 -.25 5.5 13 0 5.5
  [4,16,11,0,6,11,-.25,6,13,-.25,5.5,13,0,5.5],
// 4 16 8 0 6 8 -.25 6 11 -.25 6 11 0 6
  [4,16,8,0,6,8,-.25,6,11,-.25,6,11,0,6],
// 5 24 -14.5 -.25 -9.5 -14.5 0 -9.5 -13 -.25 -11 -15 -.25 -7.5
  [5,24,-14.5,-.25,-9.5,-14.5,0,-9.5,-13,-.25,-11,-15,-.25,-7.5],
// 5 24 -13 -.25 -11 -13 0 -11 -14.5 -.25 -9.5 -11 -.25 -11.5
  [5,24,-13,-.25,-11,-13,0,-11,-14.5,-.25,-9.5,-11,-.25,-11.5],
// 5 24 -11 -.25 -11.5 -11 0 -11.5 11 -.25 -11.5 -13 -.25 -11
  [5,24,-11,-.25,-11.5,-11,0,-11.5,11,-.25,-11.5,-13,-.25,-11],
// 5 24 11 -.25 -11.5 11 0 -11.5 13 -.25 -11 -11 -.25 -11.5
  [5,24,11,-.25,-11.5,11,0,-11.5,13,-.25,-11,-11,-.25,-11.5],
// 5 24 13 -.25 -11 13 0 -11 14.5 -.25 -9.5 11 -.25 -11.5
  [5,24,13,-.25,-11,13,0,-11,14.5,-.25,-9.5,11,-.25,-11.5],
// 5 24 14.5 -.25 -9.5 14.5 0 -9.5 15 -.25 -7.5 13 -.25 -11
  [5,24,14.5,-.25,-9.5,14.5,0,-9.5,15,-.25,-7.5,13,-.25,-11],
// 5 24 15 -.25 -7.5 15 0 -7.5 15 -.25 2 14.5 -.25 -9.5
  [5,24,15,-.25,-7.5,15,0,-7.5,15,-.25,2,14.5,-.25,-9.5],
// 5 24 15 -.25 2 15 0 2 14.5 -.25 4 15 -.25 -7.5
  [5,24,15,-.25,2,15,0,2,14.5,-.25,4,15,-.25,-7.5],
// 5 24 14.5 -.25 4 14.5 0 4 13 -.25 5.5 15 -.25 2
  [5,24,14.5,-.25,4,14.5,0,4,13,-.25,5.5,15,-.25,2],
// 5 24 13 -.25 5.5 13 0 5.5 11 -.25 6 14.5 -.25 4
  [5,24,13,-.25,5.5,13,0,5.5,11,-.25,6,14.5,-.25,4],
// 5 24 11 -.25 6 11 0 6 8 -.25 6 13 -.25 5.5
  [5,24,11,-.25,6,11,0,6,8,-.25,6,13,-.25,5.5],
// 5 24 8 -.25 6 8 0 6 2 -.25 11.5 11 -.25 6
  [5,24,8,-.25,6,8,0,6,2,-.25,11.5,11,-.25,6],
// 5 24 2 -.25 11.5 2 0 11.5 .5 -.25 12.5 8 -.25 6
  [5,24,2,-.25,11.5,2,0,11.5,.5,-.25,12.5,8,-.25,6],
// 5 24 .5 -.25 12.5 .5 0 12.5 -.5 -.25 12.5 2 -.25 11.5
  [5,24,.5,-.25,12.5,.5,0,12.5,-.5,-.25,12.5,2,-.25,11.5],
// 5 24 -.5 -.25 12.5 -.5 0 12.5 -2 -.25 11.5 .5 -.25 12.5
  [5,24,-.5,-.25,12.5,-.5,0,12.5,-2,-.25,11.5,.5,-.25,12.5],
// 5 24 -2 -.25 11.5 -2 0 11.5 -8 -.25 6 -.5 -.25 12.5
  [5,24,-2,-.25,11.5,-2,0,11.5,-8,-.25,6,-.5,-.25,12.5],
// 5 24 -8 -.25 6 -8 0 6 -11 -.25 6 -2 -.25 11.5
  [5,24,-8,-.25,6,-8,0,6,-11,-.25,6,-2,-.25,11.5],
// 5 24 -11 -.25 6 -11 0 6 -13 -.25 5.5 -8 -.25 6
  [5,24,-11,-.25,6,-11,0,6,-13,-.25,5.5,-8,-.25,6],
// 5 24 -13 -.25 5.5 -13 0 5.5 -14.5 -.25 4 -11 -.25 6
  [5,24,-13,-.25,5.5,-13,0,5.5,-14.5,-.25,4,-11,-.25,6],
// 5 24 -14.5 -.25 4 -14.5 0 4 -15 -.25 2 -13 -.25 5.5
  [5,24,-14.5,-.25,4,-14.5,0,4,-15,-.25,2,-13,-.25,5.5],
// 5 24 -15 -.25 2 -15 0 2 -15 -.25 -7.5 -14.5 -.25 4
  [5,24,-15,-.25,2,-15,0,2,-15,-.25,-7.5,-14.5,-.25,4],
// 5 24 -15 -.25 -7.5 -15 0 -7.5 -14.5 -.25 -9.5 -15 -.25 2
  [5,24,-15,-.25,-7.5,-15,0,-7.5,-14.5,-.25,-9.5,-15,-.25,2],
// 
];
module ldraw_lib__4603014b(step=0, col=false, unit=2/5, alt=false, line=0.2, solid=!$preview)
    makepoly(ldraw_lib__4603014b(), step=step, col=col, unit=unit, alt=alt, line=line, solid=solid);
ldraw_lib__4603014b(line=0.2);
